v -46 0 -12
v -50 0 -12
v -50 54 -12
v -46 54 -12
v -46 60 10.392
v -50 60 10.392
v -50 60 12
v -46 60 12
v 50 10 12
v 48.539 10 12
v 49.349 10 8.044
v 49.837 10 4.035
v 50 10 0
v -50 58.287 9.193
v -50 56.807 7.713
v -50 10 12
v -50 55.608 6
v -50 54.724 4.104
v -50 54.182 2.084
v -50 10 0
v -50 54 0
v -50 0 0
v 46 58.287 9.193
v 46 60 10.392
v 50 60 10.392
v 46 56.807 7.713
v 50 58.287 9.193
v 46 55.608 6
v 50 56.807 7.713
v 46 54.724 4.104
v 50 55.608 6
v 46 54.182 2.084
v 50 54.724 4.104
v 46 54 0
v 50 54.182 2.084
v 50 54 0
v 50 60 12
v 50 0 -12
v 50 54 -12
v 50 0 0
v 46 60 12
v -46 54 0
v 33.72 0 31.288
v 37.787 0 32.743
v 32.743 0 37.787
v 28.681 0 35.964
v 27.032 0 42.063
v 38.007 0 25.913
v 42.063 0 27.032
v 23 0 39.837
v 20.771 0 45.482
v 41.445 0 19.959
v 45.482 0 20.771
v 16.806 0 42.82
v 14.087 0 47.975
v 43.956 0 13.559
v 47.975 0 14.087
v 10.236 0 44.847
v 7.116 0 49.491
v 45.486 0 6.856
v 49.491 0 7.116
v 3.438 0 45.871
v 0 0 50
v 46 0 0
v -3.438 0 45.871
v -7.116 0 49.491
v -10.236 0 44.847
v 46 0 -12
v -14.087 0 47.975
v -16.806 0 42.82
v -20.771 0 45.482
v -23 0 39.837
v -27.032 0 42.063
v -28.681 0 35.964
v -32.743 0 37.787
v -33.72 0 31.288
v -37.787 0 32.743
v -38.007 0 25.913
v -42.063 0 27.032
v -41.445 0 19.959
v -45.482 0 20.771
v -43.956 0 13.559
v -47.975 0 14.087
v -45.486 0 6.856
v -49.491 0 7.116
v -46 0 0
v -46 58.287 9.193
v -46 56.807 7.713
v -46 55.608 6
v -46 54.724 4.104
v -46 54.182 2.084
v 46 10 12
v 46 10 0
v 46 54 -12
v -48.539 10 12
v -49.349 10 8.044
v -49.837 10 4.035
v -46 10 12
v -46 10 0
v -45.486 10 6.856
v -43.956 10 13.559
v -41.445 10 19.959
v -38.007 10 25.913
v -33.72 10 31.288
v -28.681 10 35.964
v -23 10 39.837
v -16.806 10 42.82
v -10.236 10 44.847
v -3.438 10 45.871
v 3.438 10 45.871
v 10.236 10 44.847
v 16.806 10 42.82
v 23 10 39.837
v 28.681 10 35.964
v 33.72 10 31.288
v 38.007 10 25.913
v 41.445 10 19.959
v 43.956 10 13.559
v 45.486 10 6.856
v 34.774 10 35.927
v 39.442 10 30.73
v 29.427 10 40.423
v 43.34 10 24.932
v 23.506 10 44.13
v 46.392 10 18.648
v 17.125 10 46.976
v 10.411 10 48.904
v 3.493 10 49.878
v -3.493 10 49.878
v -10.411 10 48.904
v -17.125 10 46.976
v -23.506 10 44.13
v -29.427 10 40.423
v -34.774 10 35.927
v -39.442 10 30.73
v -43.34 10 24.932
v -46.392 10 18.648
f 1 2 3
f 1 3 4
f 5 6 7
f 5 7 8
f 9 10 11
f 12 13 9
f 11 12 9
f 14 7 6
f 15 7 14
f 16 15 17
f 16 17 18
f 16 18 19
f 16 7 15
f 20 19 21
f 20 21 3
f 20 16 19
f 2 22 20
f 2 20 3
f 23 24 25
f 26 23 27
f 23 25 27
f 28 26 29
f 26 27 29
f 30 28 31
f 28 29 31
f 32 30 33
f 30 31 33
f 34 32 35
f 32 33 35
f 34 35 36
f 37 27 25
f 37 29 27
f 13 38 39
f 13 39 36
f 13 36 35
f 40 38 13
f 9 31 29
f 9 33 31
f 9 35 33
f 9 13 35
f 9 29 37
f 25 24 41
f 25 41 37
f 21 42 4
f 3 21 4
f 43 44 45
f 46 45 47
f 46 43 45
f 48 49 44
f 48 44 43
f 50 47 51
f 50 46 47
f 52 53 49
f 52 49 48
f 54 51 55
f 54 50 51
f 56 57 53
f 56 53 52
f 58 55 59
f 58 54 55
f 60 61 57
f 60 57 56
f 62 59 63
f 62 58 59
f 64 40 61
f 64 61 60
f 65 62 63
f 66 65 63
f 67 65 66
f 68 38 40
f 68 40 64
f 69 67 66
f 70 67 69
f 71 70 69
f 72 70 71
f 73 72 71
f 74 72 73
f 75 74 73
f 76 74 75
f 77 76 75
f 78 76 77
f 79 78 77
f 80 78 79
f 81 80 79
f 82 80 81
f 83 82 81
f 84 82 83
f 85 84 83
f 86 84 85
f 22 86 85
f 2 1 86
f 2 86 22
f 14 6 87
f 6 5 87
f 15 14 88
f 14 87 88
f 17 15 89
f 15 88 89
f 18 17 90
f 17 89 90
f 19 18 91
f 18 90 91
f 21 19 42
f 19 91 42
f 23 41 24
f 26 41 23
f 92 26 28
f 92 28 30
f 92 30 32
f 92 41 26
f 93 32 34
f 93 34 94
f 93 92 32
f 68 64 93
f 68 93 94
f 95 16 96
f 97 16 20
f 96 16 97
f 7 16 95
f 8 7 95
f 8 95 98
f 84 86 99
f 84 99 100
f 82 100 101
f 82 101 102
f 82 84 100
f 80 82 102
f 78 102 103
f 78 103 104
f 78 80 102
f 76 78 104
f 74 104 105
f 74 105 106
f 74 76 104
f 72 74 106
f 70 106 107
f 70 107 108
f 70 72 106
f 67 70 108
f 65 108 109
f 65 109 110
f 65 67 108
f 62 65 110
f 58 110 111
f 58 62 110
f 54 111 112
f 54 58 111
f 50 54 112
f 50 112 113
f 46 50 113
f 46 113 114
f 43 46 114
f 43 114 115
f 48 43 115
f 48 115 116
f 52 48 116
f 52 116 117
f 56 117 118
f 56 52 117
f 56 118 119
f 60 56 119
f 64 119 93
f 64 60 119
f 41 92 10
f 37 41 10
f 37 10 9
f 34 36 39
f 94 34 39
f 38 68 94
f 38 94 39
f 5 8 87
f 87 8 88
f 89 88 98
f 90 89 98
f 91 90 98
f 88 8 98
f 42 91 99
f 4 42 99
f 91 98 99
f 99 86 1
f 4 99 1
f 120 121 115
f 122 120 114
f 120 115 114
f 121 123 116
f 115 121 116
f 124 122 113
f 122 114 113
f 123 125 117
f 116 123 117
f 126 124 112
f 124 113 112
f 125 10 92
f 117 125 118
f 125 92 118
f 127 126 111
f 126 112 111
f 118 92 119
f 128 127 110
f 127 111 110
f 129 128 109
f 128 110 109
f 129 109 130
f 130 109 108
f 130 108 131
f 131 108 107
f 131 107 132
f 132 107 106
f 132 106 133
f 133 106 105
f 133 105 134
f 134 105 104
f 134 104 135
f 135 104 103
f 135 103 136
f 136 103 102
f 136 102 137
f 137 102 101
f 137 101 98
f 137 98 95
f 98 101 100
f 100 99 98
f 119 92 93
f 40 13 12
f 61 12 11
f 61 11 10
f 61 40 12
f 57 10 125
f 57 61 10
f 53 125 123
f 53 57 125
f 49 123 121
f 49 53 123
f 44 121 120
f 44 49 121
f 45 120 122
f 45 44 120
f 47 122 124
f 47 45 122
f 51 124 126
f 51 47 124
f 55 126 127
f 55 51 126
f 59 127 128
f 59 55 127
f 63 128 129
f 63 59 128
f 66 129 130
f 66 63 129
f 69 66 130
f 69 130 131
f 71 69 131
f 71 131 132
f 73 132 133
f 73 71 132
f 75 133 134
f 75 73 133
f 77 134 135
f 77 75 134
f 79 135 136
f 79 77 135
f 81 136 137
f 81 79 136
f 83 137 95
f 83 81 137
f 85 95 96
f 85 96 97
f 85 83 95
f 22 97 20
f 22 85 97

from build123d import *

# Parameters (mm, degrees)
EXTRUDE_1_DEPTH     = 10
SKETCH_2_W          = 4
SKETCH_2_H          = 24
EXTRUDE_2_DEPTH     = 50
CUT_EXTRUDE_3_DEPTH = 127.885775404


with BuildPart() as part:
    # 草图1 → 凸台-拉伸1 (new body)
    with BuildSketch(Plane(origin=(0, 0, 0), x_dir=(1, 0, 0), z_dir=(0, 1, 0))):
        with BuildLine():
            Line((-50, 12), (-46, 12))
            Line((-46, 12), (-46, 0))
            ThreePointArc((-46, 0), (0, -46), (46, 0))
            Line((46, 0), (46, 12))
            Line((46, 12), (50, 12))
            Line((50, 12), (50, 0))
            ThreePointArc((50, 0), (0, -50), (-50, 0))
            Line((-50, 0), (-50, 12))
        make_face()
    extrude(amount=EXTRUDE_1_DEPTH)

    # 草图2 → 凸台-拉伸2 (add)
    with BuildSketch(Plane(origin=(0, 10, 0), x_dir=(1, 0, 0), z_dir=(0, 1, 0))):
        with Locations((-48, 0)):
            Rectangle(SKETCH_2_W, SKETCH_2_H)
        with Locations((48, 0)):
            Rectangle(SKETCH_2_W, SKETCH_2_H)
    extrude(amount=EXTRUDE_2_DEPTH)

    # 草图3 → 切除-拉伸3 (cut, through all)
    with BuildSketch(Plane(origin=(50, 0, 0), x_dir=(0, 0, -1), z_dir=(1, 0, 0))):
        with BuildLine():
            Line((0, 54), (12, 54))
            Line((12, 54), (12, 66))
            ThreePointArc((12, 66), (-8.485281374, 74.485281374), (0, 54))
        make_face()
    extrude(amount=-CUT_EXTRUDE_3_DEPTH, mode=Mode.SUBTRACT)


solid = part.part
